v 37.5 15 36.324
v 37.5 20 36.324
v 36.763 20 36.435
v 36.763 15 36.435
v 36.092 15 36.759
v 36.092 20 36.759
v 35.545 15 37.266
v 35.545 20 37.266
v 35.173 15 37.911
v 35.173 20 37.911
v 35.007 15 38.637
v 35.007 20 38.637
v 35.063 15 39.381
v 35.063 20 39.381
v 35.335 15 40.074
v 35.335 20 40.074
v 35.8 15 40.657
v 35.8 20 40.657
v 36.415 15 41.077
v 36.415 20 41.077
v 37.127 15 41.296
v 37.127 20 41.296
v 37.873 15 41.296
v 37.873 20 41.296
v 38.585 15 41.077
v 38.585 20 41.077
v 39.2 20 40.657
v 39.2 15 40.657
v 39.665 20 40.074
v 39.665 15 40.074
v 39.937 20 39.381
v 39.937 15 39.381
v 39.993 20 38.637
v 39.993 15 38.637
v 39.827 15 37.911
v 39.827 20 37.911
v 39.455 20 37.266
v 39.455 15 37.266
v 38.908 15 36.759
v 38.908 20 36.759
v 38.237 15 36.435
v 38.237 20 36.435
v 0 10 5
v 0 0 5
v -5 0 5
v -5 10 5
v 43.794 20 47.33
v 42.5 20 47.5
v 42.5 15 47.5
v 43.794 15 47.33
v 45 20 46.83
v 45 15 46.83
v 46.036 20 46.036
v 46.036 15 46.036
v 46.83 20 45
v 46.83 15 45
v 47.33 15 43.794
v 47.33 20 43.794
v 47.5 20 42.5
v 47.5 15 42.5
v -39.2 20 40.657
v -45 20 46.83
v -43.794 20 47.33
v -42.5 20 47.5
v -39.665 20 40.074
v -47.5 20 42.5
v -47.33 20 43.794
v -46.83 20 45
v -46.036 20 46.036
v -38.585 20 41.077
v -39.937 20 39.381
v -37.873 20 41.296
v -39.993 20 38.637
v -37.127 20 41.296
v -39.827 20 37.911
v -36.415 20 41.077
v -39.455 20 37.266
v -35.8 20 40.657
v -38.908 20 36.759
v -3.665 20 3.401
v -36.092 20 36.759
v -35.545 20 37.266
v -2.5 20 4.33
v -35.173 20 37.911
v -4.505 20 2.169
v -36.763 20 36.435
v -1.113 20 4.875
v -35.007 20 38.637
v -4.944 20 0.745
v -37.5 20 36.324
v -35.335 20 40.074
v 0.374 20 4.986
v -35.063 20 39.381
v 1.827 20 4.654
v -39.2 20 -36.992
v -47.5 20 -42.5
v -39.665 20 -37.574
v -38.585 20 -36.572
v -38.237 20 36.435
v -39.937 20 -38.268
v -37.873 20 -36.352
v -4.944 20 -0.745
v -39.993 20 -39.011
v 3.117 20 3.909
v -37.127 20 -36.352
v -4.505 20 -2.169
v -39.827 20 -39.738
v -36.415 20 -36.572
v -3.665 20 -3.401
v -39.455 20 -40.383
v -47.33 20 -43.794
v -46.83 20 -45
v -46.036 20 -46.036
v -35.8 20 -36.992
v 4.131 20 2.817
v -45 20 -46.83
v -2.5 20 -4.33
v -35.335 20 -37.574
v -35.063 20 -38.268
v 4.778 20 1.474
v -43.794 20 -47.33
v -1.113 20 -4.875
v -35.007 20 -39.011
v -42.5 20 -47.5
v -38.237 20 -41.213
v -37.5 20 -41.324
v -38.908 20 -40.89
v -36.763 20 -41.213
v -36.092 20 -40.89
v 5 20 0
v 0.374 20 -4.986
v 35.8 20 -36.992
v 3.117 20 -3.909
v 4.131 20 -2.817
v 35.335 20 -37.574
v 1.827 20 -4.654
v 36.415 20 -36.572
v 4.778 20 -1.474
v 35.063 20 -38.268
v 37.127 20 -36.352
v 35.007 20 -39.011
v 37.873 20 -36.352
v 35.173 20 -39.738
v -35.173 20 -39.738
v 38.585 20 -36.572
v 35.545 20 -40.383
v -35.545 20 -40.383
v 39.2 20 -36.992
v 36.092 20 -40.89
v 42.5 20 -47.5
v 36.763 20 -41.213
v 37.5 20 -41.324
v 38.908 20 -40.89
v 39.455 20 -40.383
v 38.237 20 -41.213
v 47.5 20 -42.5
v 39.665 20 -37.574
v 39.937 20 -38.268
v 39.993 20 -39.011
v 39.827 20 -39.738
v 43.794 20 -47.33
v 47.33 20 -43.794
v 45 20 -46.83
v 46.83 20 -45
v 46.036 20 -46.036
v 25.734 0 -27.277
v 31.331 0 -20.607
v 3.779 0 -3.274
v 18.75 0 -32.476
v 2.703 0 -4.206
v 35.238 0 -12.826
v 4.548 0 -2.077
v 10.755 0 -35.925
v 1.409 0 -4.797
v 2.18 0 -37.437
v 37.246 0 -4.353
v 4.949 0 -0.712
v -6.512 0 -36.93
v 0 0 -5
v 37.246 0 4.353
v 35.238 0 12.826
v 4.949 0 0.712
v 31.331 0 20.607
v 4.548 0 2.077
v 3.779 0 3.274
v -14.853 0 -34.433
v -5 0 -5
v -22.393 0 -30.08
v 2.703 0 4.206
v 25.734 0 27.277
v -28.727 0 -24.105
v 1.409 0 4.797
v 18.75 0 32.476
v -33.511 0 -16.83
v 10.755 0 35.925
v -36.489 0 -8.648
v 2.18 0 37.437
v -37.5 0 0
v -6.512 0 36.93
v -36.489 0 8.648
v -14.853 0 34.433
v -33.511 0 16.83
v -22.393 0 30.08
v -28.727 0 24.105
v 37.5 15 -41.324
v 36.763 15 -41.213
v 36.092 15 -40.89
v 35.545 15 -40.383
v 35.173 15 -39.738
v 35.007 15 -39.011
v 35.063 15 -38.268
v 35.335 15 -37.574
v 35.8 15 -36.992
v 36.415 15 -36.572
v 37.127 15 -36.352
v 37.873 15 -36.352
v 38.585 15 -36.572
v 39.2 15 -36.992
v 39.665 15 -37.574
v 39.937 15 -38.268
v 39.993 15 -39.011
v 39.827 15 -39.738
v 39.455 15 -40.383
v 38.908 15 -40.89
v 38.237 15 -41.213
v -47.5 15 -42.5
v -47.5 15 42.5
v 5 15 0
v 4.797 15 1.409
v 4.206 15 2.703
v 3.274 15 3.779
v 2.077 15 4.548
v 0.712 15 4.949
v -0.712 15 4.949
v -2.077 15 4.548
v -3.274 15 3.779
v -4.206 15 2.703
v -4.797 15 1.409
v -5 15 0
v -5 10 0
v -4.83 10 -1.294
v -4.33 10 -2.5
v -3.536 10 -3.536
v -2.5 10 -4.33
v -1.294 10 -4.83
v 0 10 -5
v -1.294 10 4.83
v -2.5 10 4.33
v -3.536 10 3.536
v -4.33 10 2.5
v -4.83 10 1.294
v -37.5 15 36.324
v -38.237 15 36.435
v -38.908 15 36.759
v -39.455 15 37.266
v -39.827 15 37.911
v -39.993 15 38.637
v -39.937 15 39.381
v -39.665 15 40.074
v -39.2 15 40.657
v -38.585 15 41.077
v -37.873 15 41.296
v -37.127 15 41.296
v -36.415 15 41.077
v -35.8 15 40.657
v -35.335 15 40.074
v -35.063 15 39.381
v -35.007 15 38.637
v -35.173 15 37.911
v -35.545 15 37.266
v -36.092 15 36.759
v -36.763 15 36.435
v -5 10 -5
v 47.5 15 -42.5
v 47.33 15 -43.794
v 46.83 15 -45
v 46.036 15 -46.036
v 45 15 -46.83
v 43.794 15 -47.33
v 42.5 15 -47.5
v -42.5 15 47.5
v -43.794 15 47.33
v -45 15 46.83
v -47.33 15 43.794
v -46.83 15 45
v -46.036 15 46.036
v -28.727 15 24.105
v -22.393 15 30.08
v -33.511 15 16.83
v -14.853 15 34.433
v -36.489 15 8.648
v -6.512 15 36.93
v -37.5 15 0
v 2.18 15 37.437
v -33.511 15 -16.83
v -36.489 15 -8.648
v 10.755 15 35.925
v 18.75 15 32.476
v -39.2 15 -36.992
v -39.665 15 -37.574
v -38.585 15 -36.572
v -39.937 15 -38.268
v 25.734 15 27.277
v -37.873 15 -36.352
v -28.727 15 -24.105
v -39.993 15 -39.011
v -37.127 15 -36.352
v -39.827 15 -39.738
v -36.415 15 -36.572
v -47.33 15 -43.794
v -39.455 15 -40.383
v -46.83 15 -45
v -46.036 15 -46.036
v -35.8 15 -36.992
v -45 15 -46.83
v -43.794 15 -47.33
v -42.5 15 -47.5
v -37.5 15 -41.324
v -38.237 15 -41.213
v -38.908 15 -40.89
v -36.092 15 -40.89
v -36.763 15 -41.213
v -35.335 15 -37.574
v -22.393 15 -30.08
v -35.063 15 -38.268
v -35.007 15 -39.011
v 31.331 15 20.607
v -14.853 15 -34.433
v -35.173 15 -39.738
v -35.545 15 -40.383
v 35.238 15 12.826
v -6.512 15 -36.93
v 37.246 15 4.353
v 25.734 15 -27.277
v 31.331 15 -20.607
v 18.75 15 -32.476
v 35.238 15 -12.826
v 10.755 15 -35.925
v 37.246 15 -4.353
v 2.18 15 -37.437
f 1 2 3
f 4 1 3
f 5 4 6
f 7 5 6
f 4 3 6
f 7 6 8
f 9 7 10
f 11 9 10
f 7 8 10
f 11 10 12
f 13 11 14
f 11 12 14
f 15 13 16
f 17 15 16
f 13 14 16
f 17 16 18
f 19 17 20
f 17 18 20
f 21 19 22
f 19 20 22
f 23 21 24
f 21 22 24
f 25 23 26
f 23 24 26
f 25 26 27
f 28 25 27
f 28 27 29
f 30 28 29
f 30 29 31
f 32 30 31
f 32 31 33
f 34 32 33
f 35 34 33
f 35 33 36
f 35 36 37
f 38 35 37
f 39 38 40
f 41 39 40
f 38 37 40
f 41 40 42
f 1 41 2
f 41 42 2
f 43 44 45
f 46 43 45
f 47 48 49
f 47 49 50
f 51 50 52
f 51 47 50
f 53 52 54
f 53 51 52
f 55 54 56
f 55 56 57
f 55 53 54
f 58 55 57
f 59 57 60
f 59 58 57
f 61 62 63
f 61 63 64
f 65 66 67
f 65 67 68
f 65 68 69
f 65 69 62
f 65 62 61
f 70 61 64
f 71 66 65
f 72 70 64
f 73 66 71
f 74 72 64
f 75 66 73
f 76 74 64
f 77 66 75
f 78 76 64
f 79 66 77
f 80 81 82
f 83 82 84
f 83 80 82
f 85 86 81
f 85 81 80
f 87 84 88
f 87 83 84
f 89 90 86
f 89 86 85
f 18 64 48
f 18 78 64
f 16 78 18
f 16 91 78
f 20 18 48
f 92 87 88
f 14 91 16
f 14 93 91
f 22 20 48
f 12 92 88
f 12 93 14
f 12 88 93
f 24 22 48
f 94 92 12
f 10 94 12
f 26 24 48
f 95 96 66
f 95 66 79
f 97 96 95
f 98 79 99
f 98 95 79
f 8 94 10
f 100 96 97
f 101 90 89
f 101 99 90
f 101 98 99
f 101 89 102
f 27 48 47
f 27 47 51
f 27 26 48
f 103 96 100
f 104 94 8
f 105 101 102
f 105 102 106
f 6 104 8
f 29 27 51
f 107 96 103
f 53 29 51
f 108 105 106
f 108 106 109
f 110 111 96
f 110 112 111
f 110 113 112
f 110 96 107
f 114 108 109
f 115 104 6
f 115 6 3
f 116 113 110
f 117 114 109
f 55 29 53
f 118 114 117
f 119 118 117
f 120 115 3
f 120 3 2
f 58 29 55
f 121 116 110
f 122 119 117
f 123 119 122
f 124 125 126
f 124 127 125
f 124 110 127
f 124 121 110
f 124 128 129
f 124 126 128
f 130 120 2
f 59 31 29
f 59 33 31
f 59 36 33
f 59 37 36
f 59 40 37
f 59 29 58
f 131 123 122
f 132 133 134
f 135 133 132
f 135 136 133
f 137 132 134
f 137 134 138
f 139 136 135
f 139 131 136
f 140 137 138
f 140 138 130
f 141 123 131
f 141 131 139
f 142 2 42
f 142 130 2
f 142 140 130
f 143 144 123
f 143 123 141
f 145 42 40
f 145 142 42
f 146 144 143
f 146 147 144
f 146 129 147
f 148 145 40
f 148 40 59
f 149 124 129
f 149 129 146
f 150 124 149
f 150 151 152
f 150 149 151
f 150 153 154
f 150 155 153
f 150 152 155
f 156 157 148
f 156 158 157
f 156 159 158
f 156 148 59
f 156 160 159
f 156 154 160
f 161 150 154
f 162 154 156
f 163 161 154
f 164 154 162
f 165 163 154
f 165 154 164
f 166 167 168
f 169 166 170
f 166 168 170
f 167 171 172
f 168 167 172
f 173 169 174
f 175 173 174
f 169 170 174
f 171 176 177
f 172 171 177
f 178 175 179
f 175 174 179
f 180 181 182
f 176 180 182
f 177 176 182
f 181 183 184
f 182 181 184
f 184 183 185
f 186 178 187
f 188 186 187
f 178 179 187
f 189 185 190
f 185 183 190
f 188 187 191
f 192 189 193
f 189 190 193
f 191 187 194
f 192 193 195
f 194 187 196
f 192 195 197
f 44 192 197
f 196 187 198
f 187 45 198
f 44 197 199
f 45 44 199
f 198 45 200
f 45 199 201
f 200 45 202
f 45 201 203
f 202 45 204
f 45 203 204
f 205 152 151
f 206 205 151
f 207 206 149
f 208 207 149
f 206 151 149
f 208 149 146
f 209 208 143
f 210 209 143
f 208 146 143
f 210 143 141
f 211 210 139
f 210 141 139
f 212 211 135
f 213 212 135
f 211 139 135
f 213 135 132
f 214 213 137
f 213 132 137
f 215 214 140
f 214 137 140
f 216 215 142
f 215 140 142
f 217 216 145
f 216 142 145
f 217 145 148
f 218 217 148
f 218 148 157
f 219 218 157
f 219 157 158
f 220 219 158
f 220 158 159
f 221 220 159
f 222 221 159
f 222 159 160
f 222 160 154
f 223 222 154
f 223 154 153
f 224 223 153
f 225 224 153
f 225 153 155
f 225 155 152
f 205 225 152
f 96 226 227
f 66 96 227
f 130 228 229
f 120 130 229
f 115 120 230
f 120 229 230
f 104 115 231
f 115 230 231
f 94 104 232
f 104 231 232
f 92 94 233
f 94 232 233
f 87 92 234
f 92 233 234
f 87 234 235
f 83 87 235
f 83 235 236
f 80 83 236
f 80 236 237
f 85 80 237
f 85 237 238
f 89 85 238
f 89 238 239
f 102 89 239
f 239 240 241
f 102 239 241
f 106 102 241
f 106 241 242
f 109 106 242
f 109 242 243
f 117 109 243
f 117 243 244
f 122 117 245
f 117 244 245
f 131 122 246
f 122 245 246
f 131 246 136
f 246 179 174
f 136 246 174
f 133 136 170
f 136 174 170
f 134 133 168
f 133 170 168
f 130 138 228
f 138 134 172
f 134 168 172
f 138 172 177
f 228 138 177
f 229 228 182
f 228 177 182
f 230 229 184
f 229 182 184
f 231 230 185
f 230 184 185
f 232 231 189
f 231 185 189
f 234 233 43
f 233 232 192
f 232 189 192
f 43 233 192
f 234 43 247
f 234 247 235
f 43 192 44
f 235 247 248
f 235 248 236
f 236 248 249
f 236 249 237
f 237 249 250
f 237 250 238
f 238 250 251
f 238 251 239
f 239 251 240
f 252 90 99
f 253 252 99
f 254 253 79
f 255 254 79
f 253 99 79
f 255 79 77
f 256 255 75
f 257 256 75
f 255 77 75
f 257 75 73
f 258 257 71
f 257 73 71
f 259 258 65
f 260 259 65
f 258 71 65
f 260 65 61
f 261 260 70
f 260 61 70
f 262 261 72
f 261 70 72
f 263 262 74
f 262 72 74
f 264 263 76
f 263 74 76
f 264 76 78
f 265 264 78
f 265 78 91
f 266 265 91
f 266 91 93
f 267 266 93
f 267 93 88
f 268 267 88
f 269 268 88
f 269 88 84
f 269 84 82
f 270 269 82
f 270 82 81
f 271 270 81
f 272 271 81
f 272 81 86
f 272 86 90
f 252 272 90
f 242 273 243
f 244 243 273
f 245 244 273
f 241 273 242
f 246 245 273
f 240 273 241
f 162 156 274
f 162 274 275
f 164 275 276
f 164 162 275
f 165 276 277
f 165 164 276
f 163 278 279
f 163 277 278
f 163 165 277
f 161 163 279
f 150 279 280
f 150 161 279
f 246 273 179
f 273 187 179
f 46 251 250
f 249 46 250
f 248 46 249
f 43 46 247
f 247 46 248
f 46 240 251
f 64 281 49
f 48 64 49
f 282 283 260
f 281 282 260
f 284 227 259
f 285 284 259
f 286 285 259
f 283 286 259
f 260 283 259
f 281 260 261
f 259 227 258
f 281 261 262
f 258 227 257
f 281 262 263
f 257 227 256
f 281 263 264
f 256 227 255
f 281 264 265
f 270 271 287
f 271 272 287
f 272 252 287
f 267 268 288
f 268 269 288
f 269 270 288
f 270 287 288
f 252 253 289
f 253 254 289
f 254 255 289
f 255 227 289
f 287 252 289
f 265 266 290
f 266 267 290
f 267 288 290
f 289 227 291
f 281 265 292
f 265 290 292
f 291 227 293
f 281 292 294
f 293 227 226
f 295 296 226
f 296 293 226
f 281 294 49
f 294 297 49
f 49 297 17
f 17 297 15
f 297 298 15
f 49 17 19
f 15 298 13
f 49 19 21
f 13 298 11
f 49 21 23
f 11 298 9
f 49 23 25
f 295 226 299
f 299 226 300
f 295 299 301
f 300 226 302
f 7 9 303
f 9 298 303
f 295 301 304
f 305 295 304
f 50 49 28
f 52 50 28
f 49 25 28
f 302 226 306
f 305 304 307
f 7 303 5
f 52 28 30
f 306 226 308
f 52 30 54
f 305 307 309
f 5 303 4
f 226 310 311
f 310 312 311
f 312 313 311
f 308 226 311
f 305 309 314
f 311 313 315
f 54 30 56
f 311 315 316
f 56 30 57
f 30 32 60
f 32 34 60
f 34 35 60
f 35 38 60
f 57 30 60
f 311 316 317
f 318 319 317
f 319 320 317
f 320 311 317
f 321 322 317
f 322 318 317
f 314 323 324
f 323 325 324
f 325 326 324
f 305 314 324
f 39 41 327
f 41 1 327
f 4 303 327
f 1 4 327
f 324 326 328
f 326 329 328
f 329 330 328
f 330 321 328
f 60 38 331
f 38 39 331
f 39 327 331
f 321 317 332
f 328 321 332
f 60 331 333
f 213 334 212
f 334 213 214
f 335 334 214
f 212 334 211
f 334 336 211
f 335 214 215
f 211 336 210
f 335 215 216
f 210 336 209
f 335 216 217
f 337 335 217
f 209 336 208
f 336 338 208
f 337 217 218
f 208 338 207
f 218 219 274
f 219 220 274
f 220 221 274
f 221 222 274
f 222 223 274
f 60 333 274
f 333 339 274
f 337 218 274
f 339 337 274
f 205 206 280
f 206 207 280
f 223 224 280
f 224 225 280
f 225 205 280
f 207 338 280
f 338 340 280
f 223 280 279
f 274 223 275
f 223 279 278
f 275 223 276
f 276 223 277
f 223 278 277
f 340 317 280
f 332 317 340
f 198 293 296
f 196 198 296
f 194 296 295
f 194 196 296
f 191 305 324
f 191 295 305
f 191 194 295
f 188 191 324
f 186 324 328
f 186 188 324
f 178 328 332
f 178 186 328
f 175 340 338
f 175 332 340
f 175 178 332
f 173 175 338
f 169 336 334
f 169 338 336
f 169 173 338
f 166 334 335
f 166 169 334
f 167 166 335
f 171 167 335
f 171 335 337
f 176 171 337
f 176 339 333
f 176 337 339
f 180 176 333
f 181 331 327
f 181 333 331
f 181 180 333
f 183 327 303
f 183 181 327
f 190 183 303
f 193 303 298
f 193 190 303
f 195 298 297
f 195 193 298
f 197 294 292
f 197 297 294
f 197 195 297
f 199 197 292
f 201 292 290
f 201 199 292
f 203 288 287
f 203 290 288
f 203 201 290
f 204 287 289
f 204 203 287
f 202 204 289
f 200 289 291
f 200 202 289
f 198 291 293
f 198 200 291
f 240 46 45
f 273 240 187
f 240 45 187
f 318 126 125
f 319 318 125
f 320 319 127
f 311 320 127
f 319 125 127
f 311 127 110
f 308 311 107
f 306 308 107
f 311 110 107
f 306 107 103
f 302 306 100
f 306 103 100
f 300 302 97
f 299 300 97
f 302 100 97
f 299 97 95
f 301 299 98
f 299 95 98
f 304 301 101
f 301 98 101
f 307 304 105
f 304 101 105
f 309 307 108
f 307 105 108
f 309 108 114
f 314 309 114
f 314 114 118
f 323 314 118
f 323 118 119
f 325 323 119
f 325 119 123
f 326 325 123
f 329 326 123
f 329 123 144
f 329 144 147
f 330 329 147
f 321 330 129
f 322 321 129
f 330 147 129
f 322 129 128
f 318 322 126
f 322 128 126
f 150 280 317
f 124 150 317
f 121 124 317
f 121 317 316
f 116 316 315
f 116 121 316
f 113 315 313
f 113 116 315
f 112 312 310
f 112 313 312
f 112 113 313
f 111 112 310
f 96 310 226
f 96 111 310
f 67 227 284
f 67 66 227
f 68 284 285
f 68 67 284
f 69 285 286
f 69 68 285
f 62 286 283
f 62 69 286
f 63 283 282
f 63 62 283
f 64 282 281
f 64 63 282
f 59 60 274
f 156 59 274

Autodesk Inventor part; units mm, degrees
ref_plane "YZ Plane" through (0, 0, 0) normal (1, 0, 0) x (0, 1, 0)
ref_plane "XZ Plane" through (0, 0, 0) normal (0, 1, 0) x (-1, 0, 0)
ref_plane "XY Plane" through (0, 0, 0) normal (0, 0, 1) x (1, 0, 0)
sketch "Sketch1" plane through (0, 0, 0) normal (0, 1, 0) x (-1, 0, 0)
  circle A0 centre (0, 0) radius 37.5
  circle A1 centre (0, 0) radius 5
  dimension "d0" = 75
  dimension "d1" = 10
extrude "Extrusion1" add sketch "Sketch1" along normal blind 15
sketch "Sketch2" plane through (0, 15, 0) normal (0, 1, 0) x (1, 0, 0)
  line L0 (-47.5, -47.5) -> (47.5, -47.5)
  line L1 (47.5, -47.5) -> (47.5, 47.5)
  line L2 (47.5, 47.5) -> (-47.5, 47.5)
  line L3 (-47.5, 47.5) -> (-47.5, -47.5)
  line L4 (-47.5, -47.5) -> (47.5, 47.5) construction
  line L5 (47.5, -47.5) -> (-47.5, 47.5) construction
  circle A0 centre (0, 0) radius 37.5 projected
  circle A1 centre (0, 0) radius 5 projected
  line L6 (-10, -5) -> (0, -5)
  line L7 (0, -5) -> (0, 5)
  line L8 (0, 5) -> (-10, 5)
  line L9 (-10, 5) -> (-10, -5)
  line L10 (-10, -5) -> (0, 5) construction
  line L11 (0, -5) -> (-10, 5) construction
  point P0 (-5, 0)
  dimension "d4" = 95
  dimension "d5" = 95
extrude "Extrusion2" add sketch "Sketch2" along normal blind 5 contours L3 L2 L1 L0 | A0 | A1 L6 L9 L8
fillet "Fillet1" radius 5 4 edges at (47.5, 17.5, -47.5) (-47.5, 17.5, -47.5) (47.5, 17.5, 47.5) (-47.5, 17.5, 47.5)
sketch "Sketch4" plane through (0, 0, 0) normal (0, -1, 0) x (1, 0, 0)
  circle A0 centre (0, 0) radius 37.5 projected
  circle A1 centre (0, 0) radius 5 projected
  line L0 (0, 5) -> (-5, 5)
  line L1 (-5, 5) -> (-5, 0)
  line L2 (-5, -5) -> (0, -5)
  line L3 (-5, -5) -> (-5, 0)
sketch "Sketch4 outline for Extrusion3" plane through (0, 0, 0) normal (0, -1, 0) x (1, 0, 0)
  line L0 (-5, 0) -> (-5, -5)
  arc A0 (0, -5) -> (-5, 0) centre (0, 0) cw
  line L1 (-5, -5) -> (0, -5)
  line L2 (-5, 5) -> (-5, 0)
  line L3 (0, 5) -> (-5, 5)
  arc A1 (-5, 0) -> (0, 5) centre (0, 0) cw
extrude "Extrusion3" cut sketch "Sketch4 outline for Extrusion3" against normal blind 10
sketch "Sketch6" plane through (0, 15, 0) normal (0, -1, 0) x (1, 0, 0)
  line L0 (37.5, 38.824232) -> (-37.5, 38.824232)
  line L1 (-37.5, 38.824232) -> (-37.5, -38.824232)
  line L2 (-37.5, -38.824232) -> (37.5, -38.824232)
  line L3 (37.5, -38.824232) -> (37.5, 38.824232)
  line L4 (37.5, 38.824232) -> (-37.5, -38.824232) construction
  line L5 (-37.5, 38.824232) -> (37.5, -38.824232) construction
  point P0 (0, 0)
  dimension "d11" = 75
hole "Hole1" at (37.5, 15, -38.824232) at (-37.5, 15, -38.824232) at (-37.5, 15, 38.824232) at (37.5, 15, 38.824232) direction (0, 1, 0) diameter 5 end through all
properties part number "Saugknopf"
